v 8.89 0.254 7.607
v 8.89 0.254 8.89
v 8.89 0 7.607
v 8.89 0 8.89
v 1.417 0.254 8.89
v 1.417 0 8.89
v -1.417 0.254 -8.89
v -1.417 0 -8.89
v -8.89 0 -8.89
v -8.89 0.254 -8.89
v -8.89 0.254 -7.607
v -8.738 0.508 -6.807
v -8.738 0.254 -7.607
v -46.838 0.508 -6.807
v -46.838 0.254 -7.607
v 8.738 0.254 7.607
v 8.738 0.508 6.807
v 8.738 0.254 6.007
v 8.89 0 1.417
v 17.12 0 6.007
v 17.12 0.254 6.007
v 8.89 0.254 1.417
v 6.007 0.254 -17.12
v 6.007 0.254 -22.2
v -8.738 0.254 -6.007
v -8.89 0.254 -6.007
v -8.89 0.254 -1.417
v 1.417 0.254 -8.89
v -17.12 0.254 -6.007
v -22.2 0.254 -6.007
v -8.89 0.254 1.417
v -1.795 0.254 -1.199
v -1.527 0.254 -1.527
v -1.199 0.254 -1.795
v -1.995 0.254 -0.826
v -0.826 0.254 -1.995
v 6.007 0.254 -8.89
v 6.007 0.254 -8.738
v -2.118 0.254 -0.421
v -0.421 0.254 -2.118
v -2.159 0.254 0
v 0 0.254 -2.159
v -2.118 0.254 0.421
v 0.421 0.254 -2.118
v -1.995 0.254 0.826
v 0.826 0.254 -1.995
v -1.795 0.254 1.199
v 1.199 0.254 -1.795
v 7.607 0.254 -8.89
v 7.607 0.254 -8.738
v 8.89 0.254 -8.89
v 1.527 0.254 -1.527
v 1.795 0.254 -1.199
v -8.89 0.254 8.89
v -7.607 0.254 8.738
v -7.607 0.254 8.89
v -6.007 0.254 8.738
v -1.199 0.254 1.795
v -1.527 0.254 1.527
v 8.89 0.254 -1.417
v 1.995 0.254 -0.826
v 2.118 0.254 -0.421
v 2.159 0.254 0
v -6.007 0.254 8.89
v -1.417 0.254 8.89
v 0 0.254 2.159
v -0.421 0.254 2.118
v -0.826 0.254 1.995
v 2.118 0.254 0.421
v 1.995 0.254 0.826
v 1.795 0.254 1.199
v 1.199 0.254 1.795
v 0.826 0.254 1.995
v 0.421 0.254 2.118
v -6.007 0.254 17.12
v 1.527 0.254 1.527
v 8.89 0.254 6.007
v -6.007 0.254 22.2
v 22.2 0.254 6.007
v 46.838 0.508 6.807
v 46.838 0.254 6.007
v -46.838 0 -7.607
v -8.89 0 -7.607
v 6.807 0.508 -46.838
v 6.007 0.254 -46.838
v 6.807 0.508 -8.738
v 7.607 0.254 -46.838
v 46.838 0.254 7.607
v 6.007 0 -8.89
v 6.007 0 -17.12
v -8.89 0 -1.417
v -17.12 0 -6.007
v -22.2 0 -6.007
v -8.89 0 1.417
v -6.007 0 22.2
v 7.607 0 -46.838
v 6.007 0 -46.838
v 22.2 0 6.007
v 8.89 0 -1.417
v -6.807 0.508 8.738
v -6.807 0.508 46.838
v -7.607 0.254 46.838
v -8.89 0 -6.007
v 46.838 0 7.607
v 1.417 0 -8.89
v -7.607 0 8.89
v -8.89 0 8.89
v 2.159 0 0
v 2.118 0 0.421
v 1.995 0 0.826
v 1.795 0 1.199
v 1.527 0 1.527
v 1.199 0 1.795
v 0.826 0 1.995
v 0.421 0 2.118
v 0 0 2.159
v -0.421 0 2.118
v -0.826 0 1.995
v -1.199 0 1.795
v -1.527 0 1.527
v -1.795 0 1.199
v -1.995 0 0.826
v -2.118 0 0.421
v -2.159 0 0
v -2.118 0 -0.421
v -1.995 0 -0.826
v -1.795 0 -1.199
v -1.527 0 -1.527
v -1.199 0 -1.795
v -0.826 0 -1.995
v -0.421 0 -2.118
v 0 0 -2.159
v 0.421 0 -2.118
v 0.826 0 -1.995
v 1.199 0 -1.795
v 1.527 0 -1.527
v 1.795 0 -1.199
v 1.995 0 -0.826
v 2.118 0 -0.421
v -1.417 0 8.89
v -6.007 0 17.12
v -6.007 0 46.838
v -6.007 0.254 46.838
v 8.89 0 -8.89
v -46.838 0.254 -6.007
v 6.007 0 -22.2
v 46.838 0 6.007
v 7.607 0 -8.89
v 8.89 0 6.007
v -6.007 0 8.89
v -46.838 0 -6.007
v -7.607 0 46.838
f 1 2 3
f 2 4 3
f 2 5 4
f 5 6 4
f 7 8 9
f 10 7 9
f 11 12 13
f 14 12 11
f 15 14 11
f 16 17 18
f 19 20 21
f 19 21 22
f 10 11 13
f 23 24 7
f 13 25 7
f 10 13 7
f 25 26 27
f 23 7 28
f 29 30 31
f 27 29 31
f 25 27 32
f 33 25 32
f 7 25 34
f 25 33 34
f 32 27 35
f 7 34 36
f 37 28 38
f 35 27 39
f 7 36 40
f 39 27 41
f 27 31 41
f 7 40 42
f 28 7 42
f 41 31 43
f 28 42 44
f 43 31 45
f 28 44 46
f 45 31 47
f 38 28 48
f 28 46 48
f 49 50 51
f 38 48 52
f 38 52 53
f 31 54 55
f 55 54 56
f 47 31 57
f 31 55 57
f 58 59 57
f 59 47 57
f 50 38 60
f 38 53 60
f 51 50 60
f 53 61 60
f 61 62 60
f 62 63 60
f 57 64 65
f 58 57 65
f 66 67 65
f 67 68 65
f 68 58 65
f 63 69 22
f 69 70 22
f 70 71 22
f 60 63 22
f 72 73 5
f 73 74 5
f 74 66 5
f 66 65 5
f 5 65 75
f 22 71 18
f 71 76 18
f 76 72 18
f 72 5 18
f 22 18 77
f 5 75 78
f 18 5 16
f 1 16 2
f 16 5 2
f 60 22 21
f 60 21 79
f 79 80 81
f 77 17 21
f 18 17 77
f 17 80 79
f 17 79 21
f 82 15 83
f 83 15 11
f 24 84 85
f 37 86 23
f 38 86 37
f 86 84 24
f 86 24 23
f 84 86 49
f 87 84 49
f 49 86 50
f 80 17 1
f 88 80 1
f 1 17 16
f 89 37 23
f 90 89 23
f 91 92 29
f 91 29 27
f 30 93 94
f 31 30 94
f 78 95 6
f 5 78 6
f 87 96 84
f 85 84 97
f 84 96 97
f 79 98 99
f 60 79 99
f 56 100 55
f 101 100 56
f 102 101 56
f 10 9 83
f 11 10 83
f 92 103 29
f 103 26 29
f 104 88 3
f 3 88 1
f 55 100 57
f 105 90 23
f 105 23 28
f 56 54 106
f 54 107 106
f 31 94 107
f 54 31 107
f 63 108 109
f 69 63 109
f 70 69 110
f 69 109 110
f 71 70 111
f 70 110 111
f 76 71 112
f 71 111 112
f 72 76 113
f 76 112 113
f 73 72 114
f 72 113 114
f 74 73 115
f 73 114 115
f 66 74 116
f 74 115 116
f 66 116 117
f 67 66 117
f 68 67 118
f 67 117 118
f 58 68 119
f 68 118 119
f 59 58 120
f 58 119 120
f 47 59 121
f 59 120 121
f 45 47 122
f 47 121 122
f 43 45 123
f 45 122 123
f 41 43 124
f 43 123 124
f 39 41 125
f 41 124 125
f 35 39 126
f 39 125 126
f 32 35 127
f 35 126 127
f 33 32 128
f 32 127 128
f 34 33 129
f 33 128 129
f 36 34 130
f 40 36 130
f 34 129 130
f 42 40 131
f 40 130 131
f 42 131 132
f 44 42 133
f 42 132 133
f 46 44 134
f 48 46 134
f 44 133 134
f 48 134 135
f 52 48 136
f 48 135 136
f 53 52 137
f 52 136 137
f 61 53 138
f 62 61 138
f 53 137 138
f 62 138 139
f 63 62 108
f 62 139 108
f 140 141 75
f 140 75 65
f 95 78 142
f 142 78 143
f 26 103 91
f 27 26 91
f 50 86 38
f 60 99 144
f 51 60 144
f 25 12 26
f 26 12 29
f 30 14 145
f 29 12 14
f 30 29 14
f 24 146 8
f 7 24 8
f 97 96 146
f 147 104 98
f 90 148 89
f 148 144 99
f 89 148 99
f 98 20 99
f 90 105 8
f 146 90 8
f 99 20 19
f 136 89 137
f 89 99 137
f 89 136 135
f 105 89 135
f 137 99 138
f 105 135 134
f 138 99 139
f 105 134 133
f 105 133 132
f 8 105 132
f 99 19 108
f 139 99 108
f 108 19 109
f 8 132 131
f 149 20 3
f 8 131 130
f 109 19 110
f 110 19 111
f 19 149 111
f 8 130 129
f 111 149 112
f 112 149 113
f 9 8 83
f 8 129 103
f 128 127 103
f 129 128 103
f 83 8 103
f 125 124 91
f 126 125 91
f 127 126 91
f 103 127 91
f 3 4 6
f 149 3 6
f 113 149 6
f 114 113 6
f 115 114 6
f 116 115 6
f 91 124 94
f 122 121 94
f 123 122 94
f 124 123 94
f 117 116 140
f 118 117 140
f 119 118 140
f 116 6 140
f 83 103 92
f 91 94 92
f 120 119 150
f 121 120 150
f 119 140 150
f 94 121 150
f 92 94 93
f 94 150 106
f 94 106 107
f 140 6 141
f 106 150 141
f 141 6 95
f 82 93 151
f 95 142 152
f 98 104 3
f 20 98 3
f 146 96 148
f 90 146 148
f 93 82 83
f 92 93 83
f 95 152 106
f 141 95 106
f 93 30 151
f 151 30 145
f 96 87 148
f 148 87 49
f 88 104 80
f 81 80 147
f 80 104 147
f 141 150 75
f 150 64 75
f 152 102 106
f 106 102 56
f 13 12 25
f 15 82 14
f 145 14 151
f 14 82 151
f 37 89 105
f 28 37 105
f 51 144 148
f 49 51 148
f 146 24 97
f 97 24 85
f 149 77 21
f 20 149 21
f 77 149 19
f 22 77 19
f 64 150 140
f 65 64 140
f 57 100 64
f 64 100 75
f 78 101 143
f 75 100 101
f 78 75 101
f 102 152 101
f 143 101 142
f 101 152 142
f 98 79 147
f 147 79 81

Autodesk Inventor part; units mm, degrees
ref_plane "YZ Plane" through (0, 0, 0) normal (1, 0, 0) x (0, 1, 0)
ref_plane "XZ Plane" through (0, 0, 0) normal (0, 1, 0) x (-1, 0, 0)
ref_plane "XY Plane" through (0, 0, 0) normal (0, 0, 1) x (1, 0, 0)
sketch "Sketch1" plane through (0, 0, 0) normal (0, 1, 0) x (-1, 0, 0)
  line L0 (46.8376, 46.8376) -> (-46.8376, 46.8376)
  line L1 (-46.8376, 46.8376) -> (-46.8376, -46.8376)
  line L2 (-46.8376, -46.8376) -> (46.8376, -46.8376)
  line L3 (46.8376, -46.8376) -> (46.8376, 46.8376)
  line L4 (6.0071, 6.0071) -> (-6.0071, 6.0071) construction
  line L5 (-6.0071, 6.0071) -> (-6.0071, -6.0071) construction
  line L6 (-6.0071, -6.0071) -> (6.0071, -6.0071) construction
  line L7 (6.0071, -6.0071) -> (6.0071, 6.0071) construction
  circle A0 centre (-40.0304, -40.0304) radius 2.159
  circle A1 centre (40.0304, -40.0304) radius 2.159
  circle A2 centre (40.0304, 40.0304) radius 2.159
  circle A3 centre (-40.0304, 40.0304) radius 2.159
  circle A4 centre (0, 0) radius 2.159
  point P0 (46.8376, 0)
  point P1 (0, -46.8376)
  point P2 (6.0071, 0)
  point P3 (0, -6.0071)
  dimension "d0" = 93.6752
  dimension "d1" = 12.0142
  dimension "d24" = 6.8072
  dimension "d25" = 6.8072
  dimension "d26" = 4.318
  dimension "d29" = 360
  dimension "d53" = 4.318
extrude "Extrusion1" add sketch "Sketch1" along normal blind 0.508
sketch "Sketch3" plane through (0, 0.508, 0) normal (0, 1, 0) x (1, 0, 0)
  line L0 (-6.0071, 6.0071) -> (6.0071, 6.0071) construction
  line L1 (6.0071, 6.0071) -> (6.0071, -6.0071) construction
  line L2 (6.0071, -6.0071) -> (-6.0071, -6.0071) construction
  line L3 (-6.0071, -6.0071) -> (-6.0071, 6.0071) construction
  line L4 (6.0071, 46.8376) -> (7.6073, 46.8376)
  line L5 (7.6073, 46.8376) -> (7.6073, 8.7376)
  line L6 (7.6073, 8.7376) -> (6.0071, 8.7376)
  line L7 (6.0071, 8.7376) -> (6.0071, 46.8376)
  line L8 (46.8376, 46.8376) -> (-46.8376, 46.8376) projected
  line L9 (-46.8376, 7.6073) -> (-8.7376, 7.6073)
  line L10 (-8.7376, 6.0071) -> (-46.8376, 6.0071)
  line L11 (-8.7376, 7.6073) -> (-8.7376, 6.0071)
  line L12 (-46.8376, 6.0071) -> (-46.8376, 7.6073)
  line L13 (-7.6073, -46.8376) -> (-7.6073, -8.7376)
  line L14 (-6.0071, -8.7376) -> (-6.0071, -46.8376)
  line L15 (-7.6073, -8.7376) -> (-6.0071, -8.7376)
  line L16 (-6.0071, -46.8376) -> (-7.6073, -46.8376)
  line L17 (46.8376, -7.6073) -> (8.7376, -7.6073)
  line L18 (8.7376, -6.0071) -> (46.8376, -6.0071)
  line L19 (8.7376, -7.6073) -> (8.7376, -6.0071)
  line L20 (46.8376, -6.0071) -> (46.8376, -7.6073)
  line L21 (-6.0071, 17.533) -> (-4.8756, 18.6645)
  line L22 (-4.8756, 18.6645) -> (4.1047, 9.6843)
  line L23 (4.1047, 9.6843) -> (2.9732, 8.5528)
  line L24 (2.9732, 8.5528) -> (-6.0071, 17.533)
  line L25 (0, 0) -> (-6.0071, 0) construction
  line L26 (-18.6645, -4.8756) -> (-9.6843, 4.1047)
  line L27 (-17.533, -6.0071) -> (-18.6645, -4.8756)
  line L28 (-8.5528, 2.9732) -> (-17.533, -6.0071)
  line L29 (-9.6843, 4.1047) -> (-8.5528, 2.9732)
  line L30 (4.8756, -18.6645) -> (-4.1047, -9.6843)
  line L31 (6.0071, -17.533) -> (4.8756, -18.6645)
  line L32 (-2.9732, -8.5528) -> (6.0071, -17.533)
  line L33 (-4.1047, -9.6843) -> (-2.9732, -8.5528)
  line L34 (18.6645, 4.8756) -> (9.6843, -4.1047)
  line L35 (17.533, 6.0071) -> (18.6645, 4.8756)
  line L36 (8.5528, -2.9732) -> (17.533, 6.0071)
  line L37 (9.6843, -4.1047) -> (8.5528, -2.9732)
  line L38 (37.4904, -7.6073) -> (42.5704, -7.6073)
  line L39 (42.5704, -7.6073) -> (42.5704, -35.631)
  line L40 (37.4904, -35.631) -> (37.4904, -7.6073)
  line L41 (-6.0071, -37.4904) -> (35.631, -37.4904)
  line L42 (35.631, -42.5704) -> (-6.0071, -42.5704)
  line L43 (-6.0071, -42.5704) -> (-6.0071, -37.4904)
  line L44 (0.2495, 13.5394) -> (6.0071, 13.5394)
  line L45 (6.0071, 13.5394) -> (6.0071, 14.8094)
  line L46 (6.0071, 14.8094) -> (-1.0205, 14.8094)
  line L47 (-13.5394, 0.2495) -> (-13.5394, 6.0071)
  line L48 (-14.8094, 6.0071) -> (-14.8094, -1.0205)
  line L49 (-0.2495, -13.5394) -> (-6.0071, -13.5394)
  line L50 (-6.0071, -14.8094) -> (1.0205, -14.8094)
  line L51 (13.5394, -0.2495) -> (13.5394, -6.0071)
  line L52 (14.8094, -6.0071) -> (14.8094, 1.0205)
  circle A0 centre (-40.0304, 40.0304) radius 2.159 projected
  circle A1 centre (40.0304, -40.0304) radius 2.159 projected
  line L53 (37.4904, -7.6073) -> (42.5704, -7.6073)
  arc A2 (35.631, -42.5704) -> (42.5704, -35.631) centre (40.0304, -40.0304) ccw
  arc A3 (37.4904, -35.631) -> (35.631, -37.4904) centre (40.0304, -40.0304) ccw
  line L54 (-42.5704, 7.6073) -> (-42.5704, 35.631)
  arc A4 (-35.631, 42.5704) -> (-42.5704, 35.631) centre (-40.0304, 40.0304) ccw
  line L55 (6.0071, 37.4904) -> (-35.631, 37.4904)
  line L56 (-35.631, 42.5704) -> (6.0071, 42.5704)
  arc A5 (-37.4904, 35.631) -> (-35.631, 37.4904) centre (-40.0304, 40.0304) ccw
  line L57 (-37.4904, 35.631) -> (-37.4904, 7.6073)
  circle A6 centre (0, 0) radius 3.1458
  point P0 (0, 6.0071)
  point P1 (6.0071, 0)
  point P2 (-1.517, 13.0429)
  point P3 (-13.0429, -1.517)
  point P4 (1.517, -13.0429)
  point P5 (13.0429, 1.517)
  point P6 (-0.3855, 14.1744)
  point P7 (6.0071, 14.1744)
  point P8 (40.0304, -7.6073)
  point P9 (-6.0071, -40.0304)
  point P10 (14.8094, 1.0205)
  point P11 (-6.0071, -13.5394)
  point P12 (-6.0071, -42.5704)
  point P13 (-14.8094, -1.0205)
  point P14 (6.0071, 42.5704)
  dimension "d8" = 12.0142
  dimension "d9" = 1.6002
  dimension "d10" = 38.1
  dimension "d13" = 360
  dimension "d15" = 1.6002
  dimension "d16" = 12.7
  dimension "d17" = 45
  dimension "d19" = 7.0358
  dimension "d22" = 360
  dimension "d31" = 1.27
  dimension "d34" = 360
  dimension "d40" = 5.08
  dimension "d41" = 5.08
  dimension "d42" = 5.08
  dimension "d43" = 5.08
  dimension "d46" = 180
  dimension "d55" = 6.2916
extrude "Extrusion4" cut sketch "Sketch3" against normal blind 2.54 contours L4 L5 L6 L7 | L9 L11 L10 L12 | L13 L15 L14 L16 | L17 L19 L18 L20 keep common part
sketch "Sketch6" plane through (-7.6073, 0, 46.8376) normal (0, 0, 1) x (1, 0, 0)
  line L0 (0, 0.508) -> (1.6002, 0.508) projected
  line L1 (0.8001, 0.508) -> (0, 0.254)
  line L2 (0, 0.508) -> (0, 0) projected
  line L3 (0.8001, 0.508) -> (1.6002, 0.254)
  line L4 (1.6002, 0.508) -> (1.6002, 0) projected
  line L5 (15.2146, 0.508) -> (13.6144, 0.508) projected
  line L6 (14.4145, 0.508) -> (13.6144, 0.254)
  line L7 (13.6144, 0.508) -> (13.6144, 0) projected
  line L8 (14.4145, 0.508) -> (15.2146, 0.254)
  line L9 (15.2146, 0.508) -> (15.2146, 0) projected
  line L10 (0, 0.254) -> (0, 0.508)
  line L11 (1.6002, 0.508) -> (1.6002, 0.254)
  line L12 (13.6144, 0.254) -> (13.6144, 0.508)
  line L13 (15.2146, 0.508) -> (15.2146, 0.254)
  point P0 (7.6073, 0)
extrude "Extrusion5" cut sketch "Sketch6" against normal through all
sketch "Sketch7" plane through (-46.8376, 0, -7.6073) normal (-1, 0, 0) x (0, 0, 1)
  line L0 (0, 0.508) -> (1.6002, 0.508) projected
  line L1 (0.8001, 0.508) -> (0, 0.254)
  line L2 (0, 0.508) -> (0, 0) projected
  line L3 (0.8001, 0.508) -> (1.6002, 0.254)
  line L4 (1.6002, 0.508) -> (1.6002, 0) projected
  line L5 (1.6002, 0.254) -> (1.6002, 0.508)
  line L6 (1.6002, 0.508) -> (0, 0.508)
  line L7 (0, 0.508) -> (0, 0.254)
  line L8 (15.2146, 0.508) -> (13.6144, 0.508) projected
  line L9 (14.4145, 0.508) -> (13.6144, 0.254)
  line L10 (13.6144, 0.508) -> (13.6144, 0) projected
  line L11 (14.4145, 0.508) -> (15.2146, 0.254)
  line L12 (15.2146, 0.508) -> (15.2146, 0) projected
  line L13 (15.2146, 0.254) -> (15.2146, 0.508)
  line L14 (15.2146, 0.508) -> (13.6144, 0.508)
  line L15 (13.6144, 0.508) -> (13.6144, 0.254)
  point P0 (7.6073, 0)
extrude "Extrusion6" cut sketch "Sketch7" against normal through all
sketch "Sketch9" plane through (0, 0, 0) normal (0, -1, 0) x (1, 0, 0)
  line L0 (-8.89, 8.89) -> (8.89, 8.89)
  line L1 (8.89, 8.89) -> (8.89, -8.89)
  line L2 (8.89, -8.89) -> (-8.89, -8.89)
  line L3 (-8.89, -8.89) -> (-8.89, 8.89)
  circle A0 centre (0, 0) radius 2.159
  line L4 (46.8376, 6.0071) -> (8.7376, 6.0071) projected
  line L5 (17.1195, 6.0071) -> (8.89, 1.4168)
  line L6 (22.1995, 6.0071) -> (8.89, -1.4168)
  line L7 (17.1195, 6.0071) -> (22.1995, 6.0071)
  line L8 (8.89, 1.4168) -> (8.89, -1.4168)
  line L9 (-6.0071, 17.1195) -> (-1.4168, 8.89)
  line L10 (-6.0071, 22.1995) -> (1.4168, 8.89)
  line L11 (-6.0071, 17.1195) -> (-6.0071, 22.1995)
  line L12 (-17.1195, -6.0071) -> (-8.89, -1.4168)
  line L13 (-22.1995, -6.0071) -> (-8.89, 1.4168)
  line L14 (-17.1195, -6.0071) -> (-22.1995, -6.0071)
  line L15 (6.0071, -17.1195) -> (1.4168, -8.89)
  line L16 (6.0071, -22.1995) -> (-1.4168, -8.89)
  line L17 (6.0071, -17.1195) -> (6.0071, -22.1995)
  point P0 (0, 8.89)
  point P1 (8.89, 0)
  point P2 (8.89, 0)
  point P3 (-1.4168, -8.89)
  point P4 (1.4168, 8.89)
  dimension "d62" = 17.78
  dimension "d63" = 4.318
  dimension "d65" = 5.08
  dimension "d66" = 15.24
  dimension "d69" = 360
extrude "Extrusion7" add sketch "Sketch9" against normal blind 0.254 contours L0 L1 L2 L3 | L9 L11 L10 L0 | L3 L12 L14 L13 | L2 L15 L17 L16 | L5 L4 L6 L1
properties part number "FlasherGuide"
